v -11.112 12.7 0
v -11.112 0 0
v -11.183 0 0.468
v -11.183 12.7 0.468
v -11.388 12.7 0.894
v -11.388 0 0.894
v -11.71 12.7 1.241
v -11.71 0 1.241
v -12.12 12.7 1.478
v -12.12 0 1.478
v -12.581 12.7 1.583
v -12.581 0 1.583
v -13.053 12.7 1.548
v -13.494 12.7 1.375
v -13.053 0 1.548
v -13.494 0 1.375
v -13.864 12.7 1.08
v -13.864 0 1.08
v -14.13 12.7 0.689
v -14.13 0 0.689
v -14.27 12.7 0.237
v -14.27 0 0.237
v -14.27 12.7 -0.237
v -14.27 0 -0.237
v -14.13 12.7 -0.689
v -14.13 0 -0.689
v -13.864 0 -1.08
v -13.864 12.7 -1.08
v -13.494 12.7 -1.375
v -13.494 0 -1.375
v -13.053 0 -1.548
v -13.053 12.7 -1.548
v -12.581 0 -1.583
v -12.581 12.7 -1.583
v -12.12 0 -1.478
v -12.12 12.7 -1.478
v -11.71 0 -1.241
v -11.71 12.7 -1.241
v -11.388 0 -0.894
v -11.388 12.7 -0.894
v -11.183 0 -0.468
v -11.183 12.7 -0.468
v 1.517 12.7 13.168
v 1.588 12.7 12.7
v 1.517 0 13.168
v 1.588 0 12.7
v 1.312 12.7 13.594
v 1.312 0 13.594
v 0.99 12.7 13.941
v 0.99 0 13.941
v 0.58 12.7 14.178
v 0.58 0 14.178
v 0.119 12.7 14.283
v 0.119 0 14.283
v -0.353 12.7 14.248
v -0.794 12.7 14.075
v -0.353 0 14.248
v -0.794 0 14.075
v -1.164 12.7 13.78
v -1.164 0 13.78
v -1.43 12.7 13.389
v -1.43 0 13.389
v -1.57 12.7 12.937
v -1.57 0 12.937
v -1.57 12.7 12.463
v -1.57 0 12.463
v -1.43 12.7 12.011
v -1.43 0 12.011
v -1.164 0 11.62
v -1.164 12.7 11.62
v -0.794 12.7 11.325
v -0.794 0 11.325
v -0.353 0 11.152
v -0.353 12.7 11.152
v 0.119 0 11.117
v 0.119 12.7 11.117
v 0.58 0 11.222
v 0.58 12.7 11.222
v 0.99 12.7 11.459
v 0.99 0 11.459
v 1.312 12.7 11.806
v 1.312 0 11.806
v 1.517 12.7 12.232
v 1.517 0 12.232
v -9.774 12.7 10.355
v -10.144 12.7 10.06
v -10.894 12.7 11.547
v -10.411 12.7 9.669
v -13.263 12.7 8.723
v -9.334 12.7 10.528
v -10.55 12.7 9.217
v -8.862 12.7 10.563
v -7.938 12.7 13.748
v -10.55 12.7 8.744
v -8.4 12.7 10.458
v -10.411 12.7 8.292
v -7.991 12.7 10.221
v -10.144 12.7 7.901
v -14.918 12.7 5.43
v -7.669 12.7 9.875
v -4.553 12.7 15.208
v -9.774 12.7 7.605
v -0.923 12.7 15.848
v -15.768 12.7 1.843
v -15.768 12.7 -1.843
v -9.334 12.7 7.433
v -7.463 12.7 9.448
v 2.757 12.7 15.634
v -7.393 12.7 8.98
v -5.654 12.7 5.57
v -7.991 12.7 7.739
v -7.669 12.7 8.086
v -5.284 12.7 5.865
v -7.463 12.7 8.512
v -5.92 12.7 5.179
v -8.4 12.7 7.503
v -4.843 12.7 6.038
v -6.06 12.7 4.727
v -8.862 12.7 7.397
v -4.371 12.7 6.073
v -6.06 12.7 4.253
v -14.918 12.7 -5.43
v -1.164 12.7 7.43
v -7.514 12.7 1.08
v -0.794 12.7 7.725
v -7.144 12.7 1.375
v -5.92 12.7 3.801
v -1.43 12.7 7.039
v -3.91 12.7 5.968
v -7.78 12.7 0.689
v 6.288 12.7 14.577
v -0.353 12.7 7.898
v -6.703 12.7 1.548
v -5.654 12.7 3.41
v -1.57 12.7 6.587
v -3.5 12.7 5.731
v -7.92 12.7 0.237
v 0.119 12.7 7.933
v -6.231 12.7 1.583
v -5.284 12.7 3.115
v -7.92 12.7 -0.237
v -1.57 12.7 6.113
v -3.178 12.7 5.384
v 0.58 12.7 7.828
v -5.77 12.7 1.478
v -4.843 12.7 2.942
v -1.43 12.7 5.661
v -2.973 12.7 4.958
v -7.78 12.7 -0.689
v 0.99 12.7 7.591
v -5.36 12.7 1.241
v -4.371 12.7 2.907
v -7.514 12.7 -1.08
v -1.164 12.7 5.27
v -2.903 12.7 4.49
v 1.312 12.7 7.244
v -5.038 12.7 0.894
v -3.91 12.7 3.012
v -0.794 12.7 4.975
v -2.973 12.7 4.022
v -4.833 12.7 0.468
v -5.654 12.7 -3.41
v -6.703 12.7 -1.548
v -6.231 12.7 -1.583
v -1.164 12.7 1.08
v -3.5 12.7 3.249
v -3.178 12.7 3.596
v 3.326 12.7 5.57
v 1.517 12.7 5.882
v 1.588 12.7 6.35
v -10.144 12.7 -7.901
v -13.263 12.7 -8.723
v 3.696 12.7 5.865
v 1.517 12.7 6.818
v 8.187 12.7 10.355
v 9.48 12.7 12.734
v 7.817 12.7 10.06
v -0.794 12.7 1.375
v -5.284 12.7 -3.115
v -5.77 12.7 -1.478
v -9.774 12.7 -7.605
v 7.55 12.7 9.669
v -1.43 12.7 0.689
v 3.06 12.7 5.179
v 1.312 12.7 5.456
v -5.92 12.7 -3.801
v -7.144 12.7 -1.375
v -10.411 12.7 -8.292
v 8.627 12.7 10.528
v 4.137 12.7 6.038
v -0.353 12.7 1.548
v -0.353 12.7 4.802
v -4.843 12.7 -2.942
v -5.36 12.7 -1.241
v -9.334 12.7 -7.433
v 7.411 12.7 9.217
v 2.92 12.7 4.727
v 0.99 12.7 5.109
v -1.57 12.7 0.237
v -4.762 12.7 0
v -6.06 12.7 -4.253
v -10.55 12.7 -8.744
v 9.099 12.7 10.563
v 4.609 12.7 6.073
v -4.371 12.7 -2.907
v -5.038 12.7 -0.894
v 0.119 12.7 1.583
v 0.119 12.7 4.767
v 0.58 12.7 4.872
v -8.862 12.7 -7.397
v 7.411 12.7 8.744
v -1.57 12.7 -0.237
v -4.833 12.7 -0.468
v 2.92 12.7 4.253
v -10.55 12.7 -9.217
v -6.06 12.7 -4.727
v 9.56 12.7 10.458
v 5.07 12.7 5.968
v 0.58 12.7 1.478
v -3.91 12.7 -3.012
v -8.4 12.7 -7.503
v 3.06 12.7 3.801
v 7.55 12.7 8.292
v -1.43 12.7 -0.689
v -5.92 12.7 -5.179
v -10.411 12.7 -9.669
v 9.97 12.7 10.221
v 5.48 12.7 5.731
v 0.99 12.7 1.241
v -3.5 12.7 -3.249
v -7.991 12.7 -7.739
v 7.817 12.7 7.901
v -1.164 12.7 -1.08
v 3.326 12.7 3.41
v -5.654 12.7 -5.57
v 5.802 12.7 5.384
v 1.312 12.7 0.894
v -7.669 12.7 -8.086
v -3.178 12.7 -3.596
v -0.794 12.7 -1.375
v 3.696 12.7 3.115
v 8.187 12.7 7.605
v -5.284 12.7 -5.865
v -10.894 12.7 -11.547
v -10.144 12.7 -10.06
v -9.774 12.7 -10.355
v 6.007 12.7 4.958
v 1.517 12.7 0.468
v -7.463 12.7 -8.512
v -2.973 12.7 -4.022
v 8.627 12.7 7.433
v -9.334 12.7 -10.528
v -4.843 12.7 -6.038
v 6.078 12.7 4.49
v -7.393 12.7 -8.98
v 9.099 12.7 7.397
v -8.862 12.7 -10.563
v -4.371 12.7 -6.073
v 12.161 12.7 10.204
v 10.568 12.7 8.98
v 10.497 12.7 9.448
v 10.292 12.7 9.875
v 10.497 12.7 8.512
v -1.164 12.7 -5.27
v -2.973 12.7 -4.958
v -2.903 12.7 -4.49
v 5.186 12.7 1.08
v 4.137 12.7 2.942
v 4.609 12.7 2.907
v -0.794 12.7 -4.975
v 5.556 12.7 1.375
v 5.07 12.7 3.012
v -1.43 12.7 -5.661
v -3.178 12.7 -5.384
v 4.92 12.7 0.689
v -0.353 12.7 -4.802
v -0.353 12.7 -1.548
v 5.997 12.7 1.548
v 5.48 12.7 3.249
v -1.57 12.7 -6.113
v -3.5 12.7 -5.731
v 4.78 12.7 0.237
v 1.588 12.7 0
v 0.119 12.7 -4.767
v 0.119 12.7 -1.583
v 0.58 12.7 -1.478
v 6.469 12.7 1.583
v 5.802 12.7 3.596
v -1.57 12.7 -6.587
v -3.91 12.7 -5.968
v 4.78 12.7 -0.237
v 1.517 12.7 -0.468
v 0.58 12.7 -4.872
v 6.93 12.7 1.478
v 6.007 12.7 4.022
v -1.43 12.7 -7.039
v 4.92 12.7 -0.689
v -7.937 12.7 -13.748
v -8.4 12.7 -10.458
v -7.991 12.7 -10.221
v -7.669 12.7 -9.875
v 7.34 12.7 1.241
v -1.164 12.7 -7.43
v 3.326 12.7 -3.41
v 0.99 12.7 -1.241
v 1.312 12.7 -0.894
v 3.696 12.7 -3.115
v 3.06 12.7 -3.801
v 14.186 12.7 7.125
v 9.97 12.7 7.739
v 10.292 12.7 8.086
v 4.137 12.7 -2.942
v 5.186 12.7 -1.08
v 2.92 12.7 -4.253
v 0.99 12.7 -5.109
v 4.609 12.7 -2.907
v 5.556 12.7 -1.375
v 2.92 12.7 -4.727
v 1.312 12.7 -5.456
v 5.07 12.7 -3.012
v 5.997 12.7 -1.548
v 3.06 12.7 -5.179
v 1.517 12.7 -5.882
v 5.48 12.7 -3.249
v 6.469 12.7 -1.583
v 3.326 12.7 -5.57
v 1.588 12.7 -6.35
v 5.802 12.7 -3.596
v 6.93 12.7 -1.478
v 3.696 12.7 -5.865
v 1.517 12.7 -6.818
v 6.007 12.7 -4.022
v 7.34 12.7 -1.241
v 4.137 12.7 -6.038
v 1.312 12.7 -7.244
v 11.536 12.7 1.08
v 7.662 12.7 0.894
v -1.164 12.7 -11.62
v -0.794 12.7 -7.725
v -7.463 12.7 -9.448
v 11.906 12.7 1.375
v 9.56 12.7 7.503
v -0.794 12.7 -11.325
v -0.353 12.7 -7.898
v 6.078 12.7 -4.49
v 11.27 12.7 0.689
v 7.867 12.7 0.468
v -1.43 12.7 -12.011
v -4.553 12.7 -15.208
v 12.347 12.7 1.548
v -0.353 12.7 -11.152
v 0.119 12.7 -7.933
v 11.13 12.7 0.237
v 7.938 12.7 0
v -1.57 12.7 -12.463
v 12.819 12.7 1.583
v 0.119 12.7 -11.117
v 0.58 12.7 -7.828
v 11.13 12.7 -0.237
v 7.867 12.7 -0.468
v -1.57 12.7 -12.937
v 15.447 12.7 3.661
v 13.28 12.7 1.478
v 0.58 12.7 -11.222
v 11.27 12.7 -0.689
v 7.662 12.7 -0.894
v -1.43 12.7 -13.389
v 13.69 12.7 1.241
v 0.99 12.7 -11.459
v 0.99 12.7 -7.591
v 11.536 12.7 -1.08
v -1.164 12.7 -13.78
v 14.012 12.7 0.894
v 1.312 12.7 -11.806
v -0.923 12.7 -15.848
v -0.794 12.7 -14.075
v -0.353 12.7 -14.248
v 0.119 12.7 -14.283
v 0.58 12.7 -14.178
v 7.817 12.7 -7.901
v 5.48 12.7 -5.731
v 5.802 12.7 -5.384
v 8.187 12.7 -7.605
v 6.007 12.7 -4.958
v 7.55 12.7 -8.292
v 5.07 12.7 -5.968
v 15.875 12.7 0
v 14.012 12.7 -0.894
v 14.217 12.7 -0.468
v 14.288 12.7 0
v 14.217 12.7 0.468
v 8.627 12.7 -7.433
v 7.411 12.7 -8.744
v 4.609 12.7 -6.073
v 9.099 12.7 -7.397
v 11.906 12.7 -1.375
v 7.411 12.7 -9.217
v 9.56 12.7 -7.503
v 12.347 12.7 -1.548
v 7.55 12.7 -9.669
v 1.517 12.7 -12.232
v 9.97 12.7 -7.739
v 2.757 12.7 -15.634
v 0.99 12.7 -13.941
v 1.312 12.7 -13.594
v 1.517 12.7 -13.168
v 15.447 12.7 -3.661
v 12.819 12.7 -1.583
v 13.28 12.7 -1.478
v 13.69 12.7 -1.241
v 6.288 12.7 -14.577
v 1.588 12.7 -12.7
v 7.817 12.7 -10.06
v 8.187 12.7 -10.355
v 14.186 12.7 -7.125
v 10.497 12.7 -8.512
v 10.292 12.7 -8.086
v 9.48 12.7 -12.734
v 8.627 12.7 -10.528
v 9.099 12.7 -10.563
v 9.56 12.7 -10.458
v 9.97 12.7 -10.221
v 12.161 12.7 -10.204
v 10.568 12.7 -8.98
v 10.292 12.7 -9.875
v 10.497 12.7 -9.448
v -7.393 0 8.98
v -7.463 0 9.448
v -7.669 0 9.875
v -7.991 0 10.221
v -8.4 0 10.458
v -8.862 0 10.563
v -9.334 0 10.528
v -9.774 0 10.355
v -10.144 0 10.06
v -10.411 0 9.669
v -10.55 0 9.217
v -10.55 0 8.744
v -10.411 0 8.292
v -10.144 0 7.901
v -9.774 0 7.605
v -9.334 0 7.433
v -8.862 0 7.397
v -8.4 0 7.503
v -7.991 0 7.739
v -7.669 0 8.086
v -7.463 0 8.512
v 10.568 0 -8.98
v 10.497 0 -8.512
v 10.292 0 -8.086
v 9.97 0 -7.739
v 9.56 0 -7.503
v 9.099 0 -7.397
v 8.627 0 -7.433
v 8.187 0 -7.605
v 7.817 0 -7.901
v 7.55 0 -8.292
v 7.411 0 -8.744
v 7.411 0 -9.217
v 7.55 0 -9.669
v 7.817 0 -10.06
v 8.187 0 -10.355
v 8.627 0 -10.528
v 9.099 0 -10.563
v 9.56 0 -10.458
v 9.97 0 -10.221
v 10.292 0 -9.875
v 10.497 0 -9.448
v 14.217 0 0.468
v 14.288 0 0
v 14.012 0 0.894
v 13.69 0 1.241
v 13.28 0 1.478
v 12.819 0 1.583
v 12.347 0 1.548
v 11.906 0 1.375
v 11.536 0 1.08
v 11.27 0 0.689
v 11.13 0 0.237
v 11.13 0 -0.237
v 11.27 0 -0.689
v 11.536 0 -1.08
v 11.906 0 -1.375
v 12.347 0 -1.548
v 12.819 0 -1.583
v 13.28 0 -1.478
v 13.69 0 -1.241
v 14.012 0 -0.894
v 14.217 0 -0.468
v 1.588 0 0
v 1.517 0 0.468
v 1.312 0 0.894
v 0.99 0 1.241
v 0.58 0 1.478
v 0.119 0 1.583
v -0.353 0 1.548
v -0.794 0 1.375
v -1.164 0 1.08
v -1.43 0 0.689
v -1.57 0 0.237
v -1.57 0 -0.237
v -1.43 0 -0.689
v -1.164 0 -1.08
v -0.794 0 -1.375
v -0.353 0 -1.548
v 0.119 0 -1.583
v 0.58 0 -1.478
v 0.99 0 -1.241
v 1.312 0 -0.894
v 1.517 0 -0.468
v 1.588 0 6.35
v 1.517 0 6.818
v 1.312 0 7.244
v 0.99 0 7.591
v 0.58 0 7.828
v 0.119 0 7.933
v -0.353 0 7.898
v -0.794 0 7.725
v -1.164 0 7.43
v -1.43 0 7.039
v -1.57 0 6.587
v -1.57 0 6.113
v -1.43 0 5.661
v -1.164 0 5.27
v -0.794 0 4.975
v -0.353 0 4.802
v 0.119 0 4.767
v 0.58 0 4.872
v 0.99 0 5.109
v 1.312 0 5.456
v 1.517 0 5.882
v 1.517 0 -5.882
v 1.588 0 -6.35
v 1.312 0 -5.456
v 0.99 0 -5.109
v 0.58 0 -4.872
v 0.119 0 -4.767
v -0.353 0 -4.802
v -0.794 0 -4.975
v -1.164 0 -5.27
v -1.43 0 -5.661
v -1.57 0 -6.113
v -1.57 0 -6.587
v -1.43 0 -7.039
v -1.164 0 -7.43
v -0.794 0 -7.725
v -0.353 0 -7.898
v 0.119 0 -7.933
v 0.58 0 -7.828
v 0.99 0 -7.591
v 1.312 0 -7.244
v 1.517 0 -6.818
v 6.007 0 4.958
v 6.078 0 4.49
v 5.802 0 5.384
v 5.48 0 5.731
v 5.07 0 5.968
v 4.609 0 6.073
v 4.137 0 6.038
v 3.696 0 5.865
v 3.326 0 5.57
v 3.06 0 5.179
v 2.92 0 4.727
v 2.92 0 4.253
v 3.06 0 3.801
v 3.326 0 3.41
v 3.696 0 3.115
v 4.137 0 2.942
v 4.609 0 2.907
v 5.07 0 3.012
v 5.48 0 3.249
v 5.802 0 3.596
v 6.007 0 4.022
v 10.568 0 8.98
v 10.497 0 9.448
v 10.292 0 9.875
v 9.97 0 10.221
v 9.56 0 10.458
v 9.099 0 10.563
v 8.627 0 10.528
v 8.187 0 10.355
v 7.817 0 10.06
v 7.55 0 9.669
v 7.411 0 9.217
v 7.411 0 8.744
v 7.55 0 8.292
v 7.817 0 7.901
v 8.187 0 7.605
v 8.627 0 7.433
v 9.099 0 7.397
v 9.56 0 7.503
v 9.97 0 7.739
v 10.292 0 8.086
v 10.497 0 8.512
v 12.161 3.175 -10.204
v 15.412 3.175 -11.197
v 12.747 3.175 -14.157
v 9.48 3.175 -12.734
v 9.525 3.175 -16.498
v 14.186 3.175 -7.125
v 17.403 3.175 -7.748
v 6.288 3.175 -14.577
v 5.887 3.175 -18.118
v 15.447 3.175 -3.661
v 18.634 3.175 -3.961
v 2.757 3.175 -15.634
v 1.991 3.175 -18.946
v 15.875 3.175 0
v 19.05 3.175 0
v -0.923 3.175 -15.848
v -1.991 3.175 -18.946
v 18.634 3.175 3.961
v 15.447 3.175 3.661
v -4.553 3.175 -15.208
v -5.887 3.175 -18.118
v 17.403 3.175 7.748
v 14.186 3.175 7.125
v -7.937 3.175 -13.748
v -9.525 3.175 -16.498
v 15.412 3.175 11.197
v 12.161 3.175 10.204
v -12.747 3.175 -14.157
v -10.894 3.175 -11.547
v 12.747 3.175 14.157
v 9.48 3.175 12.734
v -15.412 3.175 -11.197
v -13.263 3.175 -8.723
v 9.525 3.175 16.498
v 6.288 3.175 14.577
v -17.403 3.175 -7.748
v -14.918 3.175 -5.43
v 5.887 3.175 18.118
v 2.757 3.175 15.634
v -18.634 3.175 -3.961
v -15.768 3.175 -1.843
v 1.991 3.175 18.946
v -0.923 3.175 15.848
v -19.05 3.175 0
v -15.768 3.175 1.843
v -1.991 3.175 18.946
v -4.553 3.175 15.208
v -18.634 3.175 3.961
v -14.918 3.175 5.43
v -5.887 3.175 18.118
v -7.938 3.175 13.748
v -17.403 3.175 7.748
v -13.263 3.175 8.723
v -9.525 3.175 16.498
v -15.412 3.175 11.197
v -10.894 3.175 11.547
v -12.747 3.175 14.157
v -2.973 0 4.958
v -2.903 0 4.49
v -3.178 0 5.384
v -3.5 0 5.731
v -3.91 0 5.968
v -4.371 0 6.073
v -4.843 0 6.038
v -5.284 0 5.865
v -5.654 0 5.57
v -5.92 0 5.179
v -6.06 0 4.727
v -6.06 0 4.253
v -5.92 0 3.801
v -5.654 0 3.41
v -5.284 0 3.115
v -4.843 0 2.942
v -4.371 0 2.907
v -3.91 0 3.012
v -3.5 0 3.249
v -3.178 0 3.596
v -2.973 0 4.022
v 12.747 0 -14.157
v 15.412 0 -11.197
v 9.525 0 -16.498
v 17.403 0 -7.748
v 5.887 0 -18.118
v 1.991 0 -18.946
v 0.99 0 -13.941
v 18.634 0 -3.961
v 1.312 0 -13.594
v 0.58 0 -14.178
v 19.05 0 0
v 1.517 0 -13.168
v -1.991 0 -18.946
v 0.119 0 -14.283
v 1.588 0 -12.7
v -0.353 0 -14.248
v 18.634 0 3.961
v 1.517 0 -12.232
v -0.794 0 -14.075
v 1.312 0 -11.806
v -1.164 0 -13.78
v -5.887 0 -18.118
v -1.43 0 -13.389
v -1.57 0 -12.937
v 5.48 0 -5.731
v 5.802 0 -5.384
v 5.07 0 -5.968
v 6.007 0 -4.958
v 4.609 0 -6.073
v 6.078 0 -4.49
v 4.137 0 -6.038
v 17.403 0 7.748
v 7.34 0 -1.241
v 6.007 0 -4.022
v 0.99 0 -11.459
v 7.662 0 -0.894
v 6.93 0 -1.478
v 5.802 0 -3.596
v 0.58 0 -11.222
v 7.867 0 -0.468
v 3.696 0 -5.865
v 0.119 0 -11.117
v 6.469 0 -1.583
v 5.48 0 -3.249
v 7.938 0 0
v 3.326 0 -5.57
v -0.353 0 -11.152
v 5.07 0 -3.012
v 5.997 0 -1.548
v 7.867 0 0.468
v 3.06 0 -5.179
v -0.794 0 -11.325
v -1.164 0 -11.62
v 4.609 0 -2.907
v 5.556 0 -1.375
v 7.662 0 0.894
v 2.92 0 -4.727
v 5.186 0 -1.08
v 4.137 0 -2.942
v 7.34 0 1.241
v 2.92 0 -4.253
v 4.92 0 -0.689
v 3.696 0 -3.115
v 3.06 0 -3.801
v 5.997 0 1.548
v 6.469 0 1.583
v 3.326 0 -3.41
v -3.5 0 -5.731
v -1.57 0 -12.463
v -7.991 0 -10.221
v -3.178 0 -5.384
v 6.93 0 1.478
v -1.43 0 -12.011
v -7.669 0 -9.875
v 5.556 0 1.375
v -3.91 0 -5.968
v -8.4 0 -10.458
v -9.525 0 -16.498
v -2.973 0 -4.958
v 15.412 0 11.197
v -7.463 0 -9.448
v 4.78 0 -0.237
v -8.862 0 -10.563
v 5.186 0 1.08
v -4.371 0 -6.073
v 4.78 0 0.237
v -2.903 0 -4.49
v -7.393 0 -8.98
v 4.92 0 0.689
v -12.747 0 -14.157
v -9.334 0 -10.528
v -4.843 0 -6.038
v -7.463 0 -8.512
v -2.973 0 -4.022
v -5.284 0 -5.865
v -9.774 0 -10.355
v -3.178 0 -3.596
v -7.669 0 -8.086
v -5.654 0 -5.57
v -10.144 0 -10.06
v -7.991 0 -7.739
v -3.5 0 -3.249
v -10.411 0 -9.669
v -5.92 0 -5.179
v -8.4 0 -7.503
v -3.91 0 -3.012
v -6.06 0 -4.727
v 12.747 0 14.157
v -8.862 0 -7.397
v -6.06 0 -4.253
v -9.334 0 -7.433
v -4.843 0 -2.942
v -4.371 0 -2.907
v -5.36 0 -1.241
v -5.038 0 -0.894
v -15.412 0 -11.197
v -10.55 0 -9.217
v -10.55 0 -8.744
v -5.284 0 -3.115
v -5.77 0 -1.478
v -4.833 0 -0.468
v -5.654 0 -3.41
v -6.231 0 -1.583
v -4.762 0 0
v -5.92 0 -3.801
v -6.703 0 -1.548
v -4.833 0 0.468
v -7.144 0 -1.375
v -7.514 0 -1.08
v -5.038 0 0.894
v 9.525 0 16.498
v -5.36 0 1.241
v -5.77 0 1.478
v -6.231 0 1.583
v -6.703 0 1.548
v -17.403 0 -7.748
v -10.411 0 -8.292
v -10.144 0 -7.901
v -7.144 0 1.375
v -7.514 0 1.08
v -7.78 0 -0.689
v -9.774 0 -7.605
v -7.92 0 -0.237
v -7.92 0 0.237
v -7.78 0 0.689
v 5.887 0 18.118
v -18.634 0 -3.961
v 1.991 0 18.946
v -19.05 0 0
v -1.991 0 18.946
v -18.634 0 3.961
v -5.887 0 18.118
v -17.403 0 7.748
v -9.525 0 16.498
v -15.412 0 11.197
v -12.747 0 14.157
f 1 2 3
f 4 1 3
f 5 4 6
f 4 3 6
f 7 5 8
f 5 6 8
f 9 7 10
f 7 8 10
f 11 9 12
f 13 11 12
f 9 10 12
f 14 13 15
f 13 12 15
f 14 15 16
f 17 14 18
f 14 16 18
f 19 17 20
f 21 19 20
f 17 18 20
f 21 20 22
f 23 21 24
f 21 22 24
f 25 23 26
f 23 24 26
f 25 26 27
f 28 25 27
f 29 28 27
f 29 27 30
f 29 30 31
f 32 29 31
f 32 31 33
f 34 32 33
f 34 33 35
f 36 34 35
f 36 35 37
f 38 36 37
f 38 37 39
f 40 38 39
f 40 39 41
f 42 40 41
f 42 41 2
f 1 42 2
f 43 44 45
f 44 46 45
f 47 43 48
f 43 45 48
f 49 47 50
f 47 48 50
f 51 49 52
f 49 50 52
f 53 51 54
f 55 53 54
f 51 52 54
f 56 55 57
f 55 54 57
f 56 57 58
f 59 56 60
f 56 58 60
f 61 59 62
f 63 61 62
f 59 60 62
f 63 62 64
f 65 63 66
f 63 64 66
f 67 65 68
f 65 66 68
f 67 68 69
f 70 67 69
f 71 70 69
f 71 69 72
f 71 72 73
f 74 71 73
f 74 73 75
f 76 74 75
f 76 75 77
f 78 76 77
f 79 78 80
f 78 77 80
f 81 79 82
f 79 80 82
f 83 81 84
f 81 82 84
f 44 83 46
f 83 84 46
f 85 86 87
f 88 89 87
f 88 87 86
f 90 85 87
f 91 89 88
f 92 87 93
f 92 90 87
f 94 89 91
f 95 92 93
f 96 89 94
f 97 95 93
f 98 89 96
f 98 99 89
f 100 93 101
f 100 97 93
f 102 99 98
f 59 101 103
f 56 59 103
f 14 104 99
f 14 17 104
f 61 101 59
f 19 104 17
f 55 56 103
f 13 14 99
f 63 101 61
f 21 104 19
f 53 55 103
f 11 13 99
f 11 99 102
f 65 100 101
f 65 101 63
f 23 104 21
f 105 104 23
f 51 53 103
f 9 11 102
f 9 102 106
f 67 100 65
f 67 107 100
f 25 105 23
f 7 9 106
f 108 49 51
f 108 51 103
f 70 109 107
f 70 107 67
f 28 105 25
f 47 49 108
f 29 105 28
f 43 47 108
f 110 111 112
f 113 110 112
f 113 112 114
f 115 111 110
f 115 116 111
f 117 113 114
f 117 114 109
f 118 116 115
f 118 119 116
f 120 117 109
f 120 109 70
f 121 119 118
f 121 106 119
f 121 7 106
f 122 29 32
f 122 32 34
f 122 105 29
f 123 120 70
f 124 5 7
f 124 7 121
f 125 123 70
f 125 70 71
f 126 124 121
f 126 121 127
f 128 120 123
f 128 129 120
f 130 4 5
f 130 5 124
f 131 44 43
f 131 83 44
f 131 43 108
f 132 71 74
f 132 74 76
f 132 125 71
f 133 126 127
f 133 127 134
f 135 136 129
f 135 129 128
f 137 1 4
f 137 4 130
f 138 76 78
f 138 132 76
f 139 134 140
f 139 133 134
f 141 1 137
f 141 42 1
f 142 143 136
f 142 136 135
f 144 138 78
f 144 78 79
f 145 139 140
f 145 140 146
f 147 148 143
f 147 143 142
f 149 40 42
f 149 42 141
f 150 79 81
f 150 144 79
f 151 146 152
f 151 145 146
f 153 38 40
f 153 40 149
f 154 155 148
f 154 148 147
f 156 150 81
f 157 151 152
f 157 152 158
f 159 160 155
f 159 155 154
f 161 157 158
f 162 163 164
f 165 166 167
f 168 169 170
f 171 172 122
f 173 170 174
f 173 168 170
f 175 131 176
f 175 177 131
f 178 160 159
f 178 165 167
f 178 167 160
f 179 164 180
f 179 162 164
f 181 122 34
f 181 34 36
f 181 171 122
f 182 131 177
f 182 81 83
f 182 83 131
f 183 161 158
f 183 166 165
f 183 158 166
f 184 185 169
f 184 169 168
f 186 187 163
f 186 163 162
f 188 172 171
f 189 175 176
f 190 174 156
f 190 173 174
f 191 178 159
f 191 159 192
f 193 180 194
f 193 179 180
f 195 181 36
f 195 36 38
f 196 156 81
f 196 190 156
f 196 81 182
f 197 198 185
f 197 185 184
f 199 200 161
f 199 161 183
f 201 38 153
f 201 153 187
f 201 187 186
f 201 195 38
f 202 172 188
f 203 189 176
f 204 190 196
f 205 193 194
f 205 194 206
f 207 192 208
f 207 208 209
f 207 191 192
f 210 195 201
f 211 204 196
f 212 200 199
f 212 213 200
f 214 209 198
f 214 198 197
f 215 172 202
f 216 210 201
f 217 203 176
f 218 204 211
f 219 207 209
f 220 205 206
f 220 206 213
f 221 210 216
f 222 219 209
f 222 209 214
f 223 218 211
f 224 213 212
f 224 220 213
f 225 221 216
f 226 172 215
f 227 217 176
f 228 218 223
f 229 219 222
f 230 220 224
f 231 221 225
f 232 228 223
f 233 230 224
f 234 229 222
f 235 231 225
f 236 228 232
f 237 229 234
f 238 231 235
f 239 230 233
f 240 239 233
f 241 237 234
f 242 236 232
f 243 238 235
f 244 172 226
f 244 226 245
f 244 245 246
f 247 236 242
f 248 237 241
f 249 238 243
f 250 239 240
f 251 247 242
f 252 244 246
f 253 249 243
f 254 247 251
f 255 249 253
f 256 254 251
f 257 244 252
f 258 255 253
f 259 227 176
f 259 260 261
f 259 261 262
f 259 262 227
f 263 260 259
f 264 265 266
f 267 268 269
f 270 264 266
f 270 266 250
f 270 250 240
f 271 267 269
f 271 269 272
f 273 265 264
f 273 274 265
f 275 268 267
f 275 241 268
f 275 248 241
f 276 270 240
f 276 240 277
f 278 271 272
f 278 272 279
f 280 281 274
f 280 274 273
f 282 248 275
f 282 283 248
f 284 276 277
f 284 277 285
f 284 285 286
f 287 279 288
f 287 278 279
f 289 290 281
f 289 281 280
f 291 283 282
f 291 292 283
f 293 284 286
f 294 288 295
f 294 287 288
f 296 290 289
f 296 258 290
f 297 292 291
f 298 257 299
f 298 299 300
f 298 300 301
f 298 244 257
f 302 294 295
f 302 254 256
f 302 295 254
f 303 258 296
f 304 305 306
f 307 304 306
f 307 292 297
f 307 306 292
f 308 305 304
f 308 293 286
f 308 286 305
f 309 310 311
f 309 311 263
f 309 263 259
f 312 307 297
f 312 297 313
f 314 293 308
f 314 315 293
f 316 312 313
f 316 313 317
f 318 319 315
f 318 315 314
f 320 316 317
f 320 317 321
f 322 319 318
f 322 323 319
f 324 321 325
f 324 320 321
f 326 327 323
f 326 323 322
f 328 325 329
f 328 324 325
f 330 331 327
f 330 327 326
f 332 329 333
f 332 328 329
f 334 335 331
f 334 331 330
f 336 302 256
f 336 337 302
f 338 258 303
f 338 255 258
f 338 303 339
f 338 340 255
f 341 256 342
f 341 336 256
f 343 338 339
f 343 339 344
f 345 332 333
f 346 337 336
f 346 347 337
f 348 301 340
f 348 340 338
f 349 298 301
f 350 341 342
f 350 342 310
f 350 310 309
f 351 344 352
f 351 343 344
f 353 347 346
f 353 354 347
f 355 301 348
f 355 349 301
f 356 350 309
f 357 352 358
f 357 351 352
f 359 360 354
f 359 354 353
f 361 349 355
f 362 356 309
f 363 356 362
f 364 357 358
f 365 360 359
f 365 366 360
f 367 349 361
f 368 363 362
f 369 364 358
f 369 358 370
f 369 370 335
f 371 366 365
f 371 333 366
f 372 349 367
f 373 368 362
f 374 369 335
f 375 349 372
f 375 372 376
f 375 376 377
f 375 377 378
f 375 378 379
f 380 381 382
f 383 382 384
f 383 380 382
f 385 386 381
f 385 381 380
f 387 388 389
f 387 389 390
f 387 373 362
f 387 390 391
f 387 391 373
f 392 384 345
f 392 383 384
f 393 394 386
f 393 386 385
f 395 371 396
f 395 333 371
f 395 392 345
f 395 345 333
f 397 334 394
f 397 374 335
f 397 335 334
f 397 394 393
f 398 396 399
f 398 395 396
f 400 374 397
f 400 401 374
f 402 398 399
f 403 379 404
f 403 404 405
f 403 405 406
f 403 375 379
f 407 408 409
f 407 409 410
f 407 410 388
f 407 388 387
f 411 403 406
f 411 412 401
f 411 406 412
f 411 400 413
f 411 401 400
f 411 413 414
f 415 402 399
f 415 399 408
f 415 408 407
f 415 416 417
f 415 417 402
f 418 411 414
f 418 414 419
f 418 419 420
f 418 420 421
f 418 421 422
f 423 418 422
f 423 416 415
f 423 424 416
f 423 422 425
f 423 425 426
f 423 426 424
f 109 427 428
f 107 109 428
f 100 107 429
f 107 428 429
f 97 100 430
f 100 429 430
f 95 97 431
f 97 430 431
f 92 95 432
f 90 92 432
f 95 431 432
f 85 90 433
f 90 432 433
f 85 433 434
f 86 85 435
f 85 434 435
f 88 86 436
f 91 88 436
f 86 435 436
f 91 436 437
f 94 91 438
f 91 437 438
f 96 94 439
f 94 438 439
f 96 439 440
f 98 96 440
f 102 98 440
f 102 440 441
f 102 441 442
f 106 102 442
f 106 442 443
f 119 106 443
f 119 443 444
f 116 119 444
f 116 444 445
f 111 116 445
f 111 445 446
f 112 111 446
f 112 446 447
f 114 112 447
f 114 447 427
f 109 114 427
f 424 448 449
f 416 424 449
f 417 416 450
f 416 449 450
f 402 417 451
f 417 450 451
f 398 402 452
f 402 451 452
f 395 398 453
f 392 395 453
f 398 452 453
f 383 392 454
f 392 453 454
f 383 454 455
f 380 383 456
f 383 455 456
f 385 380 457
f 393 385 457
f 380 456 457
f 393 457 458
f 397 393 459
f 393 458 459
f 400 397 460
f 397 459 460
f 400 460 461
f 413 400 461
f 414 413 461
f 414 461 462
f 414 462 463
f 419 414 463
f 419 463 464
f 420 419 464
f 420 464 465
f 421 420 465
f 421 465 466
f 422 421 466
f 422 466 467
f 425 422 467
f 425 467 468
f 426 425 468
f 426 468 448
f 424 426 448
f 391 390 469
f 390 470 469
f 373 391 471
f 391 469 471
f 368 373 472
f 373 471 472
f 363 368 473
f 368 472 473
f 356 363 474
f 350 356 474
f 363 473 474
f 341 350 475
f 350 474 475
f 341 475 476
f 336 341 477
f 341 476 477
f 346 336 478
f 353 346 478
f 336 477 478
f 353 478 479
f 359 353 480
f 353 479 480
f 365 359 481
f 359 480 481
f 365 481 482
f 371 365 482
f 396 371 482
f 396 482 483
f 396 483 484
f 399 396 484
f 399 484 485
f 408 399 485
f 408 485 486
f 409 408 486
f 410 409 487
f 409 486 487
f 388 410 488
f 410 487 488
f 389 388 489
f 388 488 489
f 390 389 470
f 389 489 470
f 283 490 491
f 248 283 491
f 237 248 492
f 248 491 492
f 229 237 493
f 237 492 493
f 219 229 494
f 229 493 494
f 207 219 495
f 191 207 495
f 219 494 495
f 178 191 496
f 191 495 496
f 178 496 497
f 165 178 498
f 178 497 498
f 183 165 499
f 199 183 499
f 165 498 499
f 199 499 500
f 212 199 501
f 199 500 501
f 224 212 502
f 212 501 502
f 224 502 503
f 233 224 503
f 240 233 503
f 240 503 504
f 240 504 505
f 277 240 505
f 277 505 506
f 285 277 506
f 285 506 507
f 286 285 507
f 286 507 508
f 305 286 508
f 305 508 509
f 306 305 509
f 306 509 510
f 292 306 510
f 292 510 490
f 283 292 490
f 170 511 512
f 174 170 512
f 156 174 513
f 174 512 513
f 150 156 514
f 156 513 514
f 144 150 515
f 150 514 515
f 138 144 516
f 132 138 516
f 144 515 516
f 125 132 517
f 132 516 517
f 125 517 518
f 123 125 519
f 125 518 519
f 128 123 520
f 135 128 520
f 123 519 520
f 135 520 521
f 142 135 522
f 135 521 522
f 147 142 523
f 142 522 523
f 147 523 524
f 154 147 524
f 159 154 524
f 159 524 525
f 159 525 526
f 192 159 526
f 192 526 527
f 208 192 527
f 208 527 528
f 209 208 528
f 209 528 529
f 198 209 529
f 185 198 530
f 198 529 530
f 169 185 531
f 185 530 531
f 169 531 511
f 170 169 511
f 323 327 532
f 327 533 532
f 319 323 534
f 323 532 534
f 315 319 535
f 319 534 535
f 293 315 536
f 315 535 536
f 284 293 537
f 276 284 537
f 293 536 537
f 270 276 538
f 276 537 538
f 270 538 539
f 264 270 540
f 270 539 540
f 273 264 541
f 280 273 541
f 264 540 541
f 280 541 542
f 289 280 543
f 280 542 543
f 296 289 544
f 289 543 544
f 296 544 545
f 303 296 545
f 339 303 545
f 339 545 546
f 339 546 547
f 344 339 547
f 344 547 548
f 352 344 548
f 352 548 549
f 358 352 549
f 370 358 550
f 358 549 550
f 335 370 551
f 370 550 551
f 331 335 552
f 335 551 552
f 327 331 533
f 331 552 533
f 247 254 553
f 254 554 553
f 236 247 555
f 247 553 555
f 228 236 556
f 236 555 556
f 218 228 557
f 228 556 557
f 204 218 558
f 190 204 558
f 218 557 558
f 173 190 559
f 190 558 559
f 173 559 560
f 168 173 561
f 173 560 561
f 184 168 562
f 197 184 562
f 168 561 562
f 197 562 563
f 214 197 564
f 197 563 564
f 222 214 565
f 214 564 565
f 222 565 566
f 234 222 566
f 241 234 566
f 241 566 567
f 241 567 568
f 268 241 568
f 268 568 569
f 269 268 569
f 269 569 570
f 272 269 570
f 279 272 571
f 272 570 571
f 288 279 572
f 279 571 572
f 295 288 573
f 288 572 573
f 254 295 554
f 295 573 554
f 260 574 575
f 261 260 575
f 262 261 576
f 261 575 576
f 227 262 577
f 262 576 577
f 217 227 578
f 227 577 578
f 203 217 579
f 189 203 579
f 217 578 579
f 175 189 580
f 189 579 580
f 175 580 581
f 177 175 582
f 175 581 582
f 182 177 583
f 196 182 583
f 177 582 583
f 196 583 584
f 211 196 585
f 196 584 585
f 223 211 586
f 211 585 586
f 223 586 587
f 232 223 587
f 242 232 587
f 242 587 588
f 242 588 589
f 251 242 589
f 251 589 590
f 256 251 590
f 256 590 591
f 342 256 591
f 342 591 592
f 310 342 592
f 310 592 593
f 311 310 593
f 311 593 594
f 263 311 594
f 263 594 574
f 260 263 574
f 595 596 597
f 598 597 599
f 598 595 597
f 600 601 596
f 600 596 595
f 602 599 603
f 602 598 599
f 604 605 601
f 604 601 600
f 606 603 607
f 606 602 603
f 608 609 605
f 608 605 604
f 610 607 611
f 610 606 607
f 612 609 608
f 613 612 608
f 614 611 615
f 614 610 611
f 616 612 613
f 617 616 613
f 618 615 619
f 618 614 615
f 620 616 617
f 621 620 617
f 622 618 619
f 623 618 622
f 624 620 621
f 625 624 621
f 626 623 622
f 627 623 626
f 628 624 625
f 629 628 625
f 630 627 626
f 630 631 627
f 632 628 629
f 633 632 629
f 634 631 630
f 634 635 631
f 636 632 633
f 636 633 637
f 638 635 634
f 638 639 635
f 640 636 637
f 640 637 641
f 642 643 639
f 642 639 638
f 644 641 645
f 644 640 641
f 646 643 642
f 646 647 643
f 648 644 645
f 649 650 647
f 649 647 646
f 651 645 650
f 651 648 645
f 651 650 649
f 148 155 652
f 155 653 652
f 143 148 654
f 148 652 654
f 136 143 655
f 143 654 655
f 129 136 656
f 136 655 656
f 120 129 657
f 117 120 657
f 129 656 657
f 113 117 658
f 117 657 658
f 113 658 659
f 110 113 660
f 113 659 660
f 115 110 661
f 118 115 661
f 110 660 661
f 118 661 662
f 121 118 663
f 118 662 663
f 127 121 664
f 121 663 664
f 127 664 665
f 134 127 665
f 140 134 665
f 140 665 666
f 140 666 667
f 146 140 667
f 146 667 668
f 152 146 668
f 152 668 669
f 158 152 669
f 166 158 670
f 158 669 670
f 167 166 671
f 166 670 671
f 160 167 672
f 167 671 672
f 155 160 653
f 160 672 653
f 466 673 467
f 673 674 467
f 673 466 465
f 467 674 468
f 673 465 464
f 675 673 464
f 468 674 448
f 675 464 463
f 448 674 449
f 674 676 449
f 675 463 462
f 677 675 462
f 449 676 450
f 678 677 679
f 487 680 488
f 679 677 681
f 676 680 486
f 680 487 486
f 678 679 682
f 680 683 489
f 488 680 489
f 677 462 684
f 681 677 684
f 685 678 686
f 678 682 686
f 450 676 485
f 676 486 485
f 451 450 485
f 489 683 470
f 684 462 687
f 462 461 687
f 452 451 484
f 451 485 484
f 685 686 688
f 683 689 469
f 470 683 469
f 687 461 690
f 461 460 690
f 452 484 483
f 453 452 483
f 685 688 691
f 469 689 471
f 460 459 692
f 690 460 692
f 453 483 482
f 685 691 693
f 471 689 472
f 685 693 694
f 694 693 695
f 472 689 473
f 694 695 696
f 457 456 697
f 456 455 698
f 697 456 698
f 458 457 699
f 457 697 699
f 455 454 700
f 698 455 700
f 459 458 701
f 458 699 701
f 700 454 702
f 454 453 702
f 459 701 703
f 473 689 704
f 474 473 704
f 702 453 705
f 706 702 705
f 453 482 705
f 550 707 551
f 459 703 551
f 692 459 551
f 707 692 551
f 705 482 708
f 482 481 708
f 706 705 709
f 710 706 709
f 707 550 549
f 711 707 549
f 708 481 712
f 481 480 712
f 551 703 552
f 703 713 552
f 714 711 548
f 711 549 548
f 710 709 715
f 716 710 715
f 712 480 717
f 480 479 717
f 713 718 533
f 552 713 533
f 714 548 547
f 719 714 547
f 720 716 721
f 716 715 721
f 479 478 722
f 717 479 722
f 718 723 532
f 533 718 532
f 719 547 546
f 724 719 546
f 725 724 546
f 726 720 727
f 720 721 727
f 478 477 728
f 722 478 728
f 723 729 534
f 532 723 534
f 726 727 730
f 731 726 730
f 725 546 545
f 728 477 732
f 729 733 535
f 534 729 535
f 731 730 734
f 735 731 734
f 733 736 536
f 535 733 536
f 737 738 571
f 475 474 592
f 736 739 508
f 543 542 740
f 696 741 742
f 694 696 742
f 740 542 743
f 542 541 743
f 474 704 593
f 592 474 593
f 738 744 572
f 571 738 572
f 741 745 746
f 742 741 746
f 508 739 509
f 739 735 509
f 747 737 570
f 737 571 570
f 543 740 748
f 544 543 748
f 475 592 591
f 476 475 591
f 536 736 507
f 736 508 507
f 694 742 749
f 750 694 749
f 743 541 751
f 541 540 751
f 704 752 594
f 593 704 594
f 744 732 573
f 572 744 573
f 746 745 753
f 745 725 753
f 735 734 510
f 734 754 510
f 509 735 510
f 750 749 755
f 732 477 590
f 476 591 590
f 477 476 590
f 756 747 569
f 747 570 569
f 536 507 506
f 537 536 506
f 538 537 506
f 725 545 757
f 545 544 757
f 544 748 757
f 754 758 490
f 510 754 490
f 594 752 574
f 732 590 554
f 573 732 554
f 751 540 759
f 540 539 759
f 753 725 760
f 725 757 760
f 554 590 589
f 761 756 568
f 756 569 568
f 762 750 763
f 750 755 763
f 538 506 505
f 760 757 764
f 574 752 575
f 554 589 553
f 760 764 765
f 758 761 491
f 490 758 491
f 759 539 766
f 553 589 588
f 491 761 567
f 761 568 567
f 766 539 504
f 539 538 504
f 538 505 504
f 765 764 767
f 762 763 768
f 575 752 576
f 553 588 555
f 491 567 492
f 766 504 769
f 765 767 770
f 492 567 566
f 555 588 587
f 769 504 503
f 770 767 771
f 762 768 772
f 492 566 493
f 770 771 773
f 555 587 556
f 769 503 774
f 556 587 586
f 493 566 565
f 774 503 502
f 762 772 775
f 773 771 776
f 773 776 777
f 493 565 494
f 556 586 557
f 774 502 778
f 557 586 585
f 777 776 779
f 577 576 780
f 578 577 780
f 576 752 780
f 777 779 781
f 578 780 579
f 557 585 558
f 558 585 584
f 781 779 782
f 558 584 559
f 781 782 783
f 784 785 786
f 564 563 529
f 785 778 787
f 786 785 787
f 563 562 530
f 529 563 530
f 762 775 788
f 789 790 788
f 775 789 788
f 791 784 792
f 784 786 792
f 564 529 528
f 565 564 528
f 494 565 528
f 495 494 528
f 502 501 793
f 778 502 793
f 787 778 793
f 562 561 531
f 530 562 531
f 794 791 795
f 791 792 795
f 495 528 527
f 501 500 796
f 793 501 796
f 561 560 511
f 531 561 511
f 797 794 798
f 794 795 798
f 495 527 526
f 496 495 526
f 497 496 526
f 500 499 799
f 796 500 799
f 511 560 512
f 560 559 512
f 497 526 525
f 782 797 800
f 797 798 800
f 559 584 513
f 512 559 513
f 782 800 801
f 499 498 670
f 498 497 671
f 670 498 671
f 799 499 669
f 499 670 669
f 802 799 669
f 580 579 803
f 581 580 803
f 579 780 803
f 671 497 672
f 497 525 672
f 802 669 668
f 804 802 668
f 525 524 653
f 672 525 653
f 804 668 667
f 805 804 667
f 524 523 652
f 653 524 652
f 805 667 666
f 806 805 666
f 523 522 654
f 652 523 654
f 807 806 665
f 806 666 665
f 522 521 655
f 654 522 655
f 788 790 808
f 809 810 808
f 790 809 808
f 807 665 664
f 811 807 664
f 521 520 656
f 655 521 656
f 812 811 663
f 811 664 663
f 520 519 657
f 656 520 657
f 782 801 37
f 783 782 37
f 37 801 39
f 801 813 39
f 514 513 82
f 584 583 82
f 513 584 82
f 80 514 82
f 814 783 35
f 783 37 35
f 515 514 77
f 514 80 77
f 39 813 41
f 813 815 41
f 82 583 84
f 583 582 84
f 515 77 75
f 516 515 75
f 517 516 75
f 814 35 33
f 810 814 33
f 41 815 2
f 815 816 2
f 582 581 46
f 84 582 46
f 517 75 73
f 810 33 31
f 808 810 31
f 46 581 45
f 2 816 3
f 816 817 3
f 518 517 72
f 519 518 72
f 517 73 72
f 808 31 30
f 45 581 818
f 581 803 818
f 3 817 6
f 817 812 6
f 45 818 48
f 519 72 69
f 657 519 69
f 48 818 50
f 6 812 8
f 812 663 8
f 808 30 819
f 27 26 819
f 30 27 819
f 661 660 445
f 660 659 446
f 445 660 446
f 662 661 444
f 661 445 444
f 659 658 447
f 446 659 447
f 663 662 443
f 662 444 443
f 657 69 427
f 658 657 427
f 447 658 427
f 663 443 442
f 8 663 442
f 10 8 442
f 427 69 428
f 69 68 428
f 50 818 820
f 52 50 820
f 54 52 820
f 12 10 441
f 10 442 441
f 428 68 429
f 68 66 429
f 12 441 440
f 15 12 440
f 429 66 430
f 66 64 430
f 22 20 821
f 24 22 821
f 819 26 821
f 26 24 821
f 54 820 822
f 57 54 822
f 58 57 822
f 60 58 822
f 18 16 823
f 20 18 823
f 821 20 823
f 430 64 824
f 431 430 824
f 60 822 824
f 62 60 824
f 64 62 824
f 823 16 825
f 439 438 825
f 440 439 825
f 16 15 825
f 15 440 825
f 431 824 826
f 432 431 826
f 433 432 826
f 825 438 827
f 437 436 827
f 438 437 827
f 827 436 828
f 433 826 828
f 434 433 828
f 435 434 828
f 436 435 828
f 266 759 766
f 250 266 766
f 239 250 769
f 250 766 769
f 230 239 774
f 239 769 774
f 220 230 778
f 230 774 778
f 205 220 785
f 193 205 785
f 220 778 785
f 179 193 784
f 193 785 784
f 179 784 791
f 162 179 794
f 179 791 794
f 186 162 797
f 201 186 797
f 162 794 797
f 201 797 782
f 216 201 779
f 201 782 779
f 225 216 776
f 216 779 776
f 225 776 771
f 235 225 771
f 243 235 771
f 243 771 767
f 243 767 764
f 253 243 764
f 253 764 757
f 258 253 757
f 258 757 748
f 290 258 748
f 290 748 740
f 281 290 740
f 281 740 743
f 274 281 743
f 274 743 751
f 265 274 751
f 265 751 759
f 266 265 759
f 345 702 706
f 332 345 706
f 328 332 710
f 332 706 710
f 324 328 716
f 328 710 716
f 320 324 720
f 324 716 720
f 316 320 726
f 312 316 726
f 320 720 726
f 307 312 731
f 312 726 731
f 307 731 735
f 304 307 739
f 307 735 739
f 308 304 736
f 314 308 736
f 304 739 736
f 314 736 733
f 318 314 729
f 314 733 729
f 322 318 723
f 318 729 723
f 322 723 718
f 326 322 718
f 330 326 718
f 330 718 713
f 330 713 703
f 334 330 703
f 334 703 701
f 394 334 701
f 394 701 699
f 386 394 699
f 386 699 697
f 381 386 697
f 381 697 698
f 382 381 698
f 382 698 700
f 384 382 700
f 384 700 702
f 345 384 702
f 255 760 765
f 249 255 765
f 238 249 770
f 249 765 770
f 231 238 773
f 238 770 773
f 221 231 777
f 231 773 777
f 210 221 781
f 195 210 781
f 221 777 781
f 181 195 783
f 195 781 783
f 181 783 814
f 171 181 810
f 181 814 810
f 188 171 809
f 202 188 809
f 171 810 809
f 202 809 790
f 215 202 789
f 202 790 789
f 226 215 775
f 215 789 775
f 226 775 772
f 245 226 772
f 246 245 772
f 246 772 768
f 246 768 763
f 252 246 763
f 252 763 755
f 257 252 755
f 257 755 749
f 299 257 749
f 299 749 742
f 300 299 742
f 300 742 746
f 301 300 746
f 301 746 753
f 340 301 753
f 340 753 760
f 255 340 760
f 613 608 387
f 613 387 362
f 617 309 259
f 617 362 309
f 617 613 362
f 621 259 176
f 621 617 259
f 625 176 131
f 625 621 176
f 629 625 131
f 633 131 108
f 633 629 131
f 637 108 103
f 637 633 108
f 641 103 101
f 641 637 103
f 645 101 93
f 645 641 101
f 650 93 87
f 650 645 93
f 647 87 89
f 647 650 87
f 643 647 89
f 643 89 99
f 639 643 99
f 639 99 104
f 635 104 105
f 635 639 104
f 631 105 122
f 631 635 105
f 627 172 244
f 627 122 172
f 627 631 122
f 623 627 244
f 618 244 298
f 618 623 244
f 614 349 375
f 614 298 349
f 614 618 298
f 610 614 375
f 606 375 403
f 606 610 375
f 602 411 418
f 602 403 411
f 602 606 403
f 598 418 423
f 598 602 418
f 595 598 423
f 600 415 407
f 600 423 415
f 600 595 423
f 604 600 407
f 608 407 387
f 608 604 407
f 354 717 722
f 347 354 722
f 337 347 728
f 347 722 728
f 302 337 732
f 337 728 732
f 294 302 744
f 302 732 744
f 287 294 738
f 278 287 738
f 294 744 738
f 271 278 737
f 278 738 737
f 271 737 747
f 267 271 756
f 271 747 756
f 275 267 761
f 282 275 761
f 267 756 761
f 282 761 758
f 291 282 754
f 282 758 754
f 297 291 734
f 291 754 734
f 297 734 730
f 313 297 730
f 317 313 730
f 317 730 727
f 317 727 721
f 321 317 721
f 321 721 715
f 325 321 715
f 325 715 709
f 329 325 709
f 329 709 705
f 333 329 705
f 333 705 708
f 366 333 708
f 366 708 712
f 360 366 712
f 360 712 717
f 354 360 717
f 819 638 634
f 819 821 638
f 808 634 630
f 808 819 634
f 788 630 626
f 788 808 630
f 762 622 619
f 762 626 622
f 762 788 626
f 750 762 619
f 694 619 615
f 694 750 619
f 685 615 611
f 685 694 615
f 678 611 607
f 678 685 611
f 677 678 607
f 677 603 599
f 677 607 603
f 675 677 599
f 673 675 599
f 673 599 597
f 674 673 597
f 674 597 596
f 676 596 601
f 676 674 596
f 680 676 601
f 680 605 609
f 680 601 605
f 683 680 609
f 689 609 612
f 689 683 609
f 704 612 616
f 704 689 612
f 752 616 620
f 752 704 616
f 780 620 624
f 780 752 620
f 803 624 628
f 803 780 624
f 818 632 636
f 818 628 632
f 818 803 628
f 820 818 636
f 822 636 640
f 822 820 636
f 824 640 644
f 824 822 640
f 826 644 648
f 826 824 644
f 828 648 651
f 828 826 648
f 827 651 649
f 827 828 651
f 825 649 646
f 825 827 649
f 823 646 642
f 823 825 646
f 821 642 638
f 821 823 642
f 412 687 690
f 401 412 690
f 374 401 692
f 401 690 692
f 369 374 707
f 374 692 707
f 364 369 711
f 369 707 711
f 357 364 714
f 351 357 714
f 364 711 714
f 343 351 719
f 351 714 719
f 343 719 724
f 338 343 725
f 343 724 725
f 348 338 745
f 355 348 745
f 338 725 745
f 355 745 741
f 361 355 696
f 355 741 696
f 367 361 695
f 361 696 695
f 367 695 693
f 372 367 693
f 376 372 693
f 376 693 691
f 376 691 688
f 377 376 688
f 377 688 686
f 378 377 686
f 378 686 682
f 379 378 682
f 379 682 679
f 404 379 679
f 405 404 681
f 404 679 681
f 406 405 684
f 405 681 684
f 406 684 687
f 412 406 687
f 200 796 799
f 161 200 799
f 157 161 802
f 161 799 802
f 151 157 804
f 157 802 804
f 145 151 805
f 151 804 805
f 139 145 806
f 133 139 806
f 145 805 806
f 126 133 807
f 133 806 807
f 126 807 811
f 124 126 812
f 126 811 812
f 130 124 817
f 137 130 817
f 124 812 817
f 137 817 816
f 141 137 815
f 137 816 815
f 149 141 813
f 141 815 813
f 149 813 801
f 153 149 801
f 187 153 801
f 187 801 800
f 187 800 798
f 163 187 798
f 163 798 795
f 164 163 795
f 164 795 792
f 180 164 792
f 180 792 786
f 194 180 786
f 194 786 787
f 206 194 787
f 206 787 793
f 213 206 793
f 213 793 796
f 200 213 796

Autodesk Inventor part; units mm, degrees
ref_plane "YZ Plane" through (0, 0, 0) normal (1, 0, 0) x (0, 1, 0)
ref_plane "XZ Plane" through (0, 0, 0) normal (0, 1, 0) x (-1, 0, 0)
ref_plane "XY Plane" through (0, 0, 0) normal (0, 0, 1) x (1, 0, 0)
sketch "Sketch1" plane through (0, 0, 0) normal (0, 1, 0) x (-1, 0, 0)
  circle A0 centre (0, 0) radius 19.05
  circle A1 centre (0, 0) radius 12.7
  dimension "d0" = 38.1
  dimension "d1" = 25.4
extrude "Extrusion1" add sketch "Sketch1" along normal blind 3.175
sketch "Sketch2" plane through (0, 3.175, 0) normal (0, 1, 0) x (1, 0, 0)
  circle A0 centre (0, 0) radius 12.7 projected
  circle A1 centre (0, 0) radius 19.05 projected
  circle A2 centre (0, 0) radius 15.875
  dimension "d4" = 31.75
extrude "Extrusion2" add sketch "Sketch2" along normal blind 9.525 contours A2
sketch "Sketch4" plane through (0, 12.7, 0) normal (0, 1, 0) x (1, 0, 0)
  circle A0 centre (0, 0) radius 12.7 projected
  circle A1 centre (0, 0) radius 15.875 projected
extrude "Extrusion4" add sketch "Sketch4" against normal up to surface (12.7 mm away) contours A0
sketch "Sketch5" plane through (0, 0, 0) normal (0, -1, 0) x (1, 0, 0)
  circle A0 centre (-6.35, 0) radius 1.5875 projected
  circle A1 centre (-12.7, 0) radius 1.5875 projected
  circle A2 centre (0, -6.35) radius 1.5875 projected
  circle A3 centre (0, -12.7) radius 1.5875 projected
  circle A4 centre (6.35, 0) radius 1.5875 projected
  circle A5 centre (12.7, 0) radius 1.5875 projected
  circle A6 centre (4.4901, 4.4901) radius 1.5875 projected
  circle A7 centre (8.9803, 8.9803) radius 1.5875 projected
  circle A8 centre (8.9803, -8.9803) radius 1.5875 projected
  circle A9 centre (4.4901, -4.4901) radius 1.5875 projected
  circle A10 centre (-8.9803, -8.9803) radius 1.5875 projected
  circle A11 centre (-4.4901, -4.4901) radius 1.5875 projected
  circle A12 centre (-8.9803, 8.9803) radius 1.5875 projected
  circle A13 centre (-4.4901, 4.4901) radius 1.5875 projected
  circle A14 centre (0, 6.35) radius 1.5875 projected
  circle A15 centre (0, 12.7) radius 1.5875 projected
  circle A16 centre (0, 0) radius 1.5875 projected
  circle A17 centre (0, 0) radius 15.875 projected
extrude "Extrusion5" cut sketch "Sketch5" against normal through all contours A0 | A1 | A2 | A3 | A4 | A5 | A6 | A7 | A8 | A9 | A10 | A11 | A12 | A13 | A14 | A15 | A16
properties part number "insideFlange" material "Polycarbonate, Clear"
